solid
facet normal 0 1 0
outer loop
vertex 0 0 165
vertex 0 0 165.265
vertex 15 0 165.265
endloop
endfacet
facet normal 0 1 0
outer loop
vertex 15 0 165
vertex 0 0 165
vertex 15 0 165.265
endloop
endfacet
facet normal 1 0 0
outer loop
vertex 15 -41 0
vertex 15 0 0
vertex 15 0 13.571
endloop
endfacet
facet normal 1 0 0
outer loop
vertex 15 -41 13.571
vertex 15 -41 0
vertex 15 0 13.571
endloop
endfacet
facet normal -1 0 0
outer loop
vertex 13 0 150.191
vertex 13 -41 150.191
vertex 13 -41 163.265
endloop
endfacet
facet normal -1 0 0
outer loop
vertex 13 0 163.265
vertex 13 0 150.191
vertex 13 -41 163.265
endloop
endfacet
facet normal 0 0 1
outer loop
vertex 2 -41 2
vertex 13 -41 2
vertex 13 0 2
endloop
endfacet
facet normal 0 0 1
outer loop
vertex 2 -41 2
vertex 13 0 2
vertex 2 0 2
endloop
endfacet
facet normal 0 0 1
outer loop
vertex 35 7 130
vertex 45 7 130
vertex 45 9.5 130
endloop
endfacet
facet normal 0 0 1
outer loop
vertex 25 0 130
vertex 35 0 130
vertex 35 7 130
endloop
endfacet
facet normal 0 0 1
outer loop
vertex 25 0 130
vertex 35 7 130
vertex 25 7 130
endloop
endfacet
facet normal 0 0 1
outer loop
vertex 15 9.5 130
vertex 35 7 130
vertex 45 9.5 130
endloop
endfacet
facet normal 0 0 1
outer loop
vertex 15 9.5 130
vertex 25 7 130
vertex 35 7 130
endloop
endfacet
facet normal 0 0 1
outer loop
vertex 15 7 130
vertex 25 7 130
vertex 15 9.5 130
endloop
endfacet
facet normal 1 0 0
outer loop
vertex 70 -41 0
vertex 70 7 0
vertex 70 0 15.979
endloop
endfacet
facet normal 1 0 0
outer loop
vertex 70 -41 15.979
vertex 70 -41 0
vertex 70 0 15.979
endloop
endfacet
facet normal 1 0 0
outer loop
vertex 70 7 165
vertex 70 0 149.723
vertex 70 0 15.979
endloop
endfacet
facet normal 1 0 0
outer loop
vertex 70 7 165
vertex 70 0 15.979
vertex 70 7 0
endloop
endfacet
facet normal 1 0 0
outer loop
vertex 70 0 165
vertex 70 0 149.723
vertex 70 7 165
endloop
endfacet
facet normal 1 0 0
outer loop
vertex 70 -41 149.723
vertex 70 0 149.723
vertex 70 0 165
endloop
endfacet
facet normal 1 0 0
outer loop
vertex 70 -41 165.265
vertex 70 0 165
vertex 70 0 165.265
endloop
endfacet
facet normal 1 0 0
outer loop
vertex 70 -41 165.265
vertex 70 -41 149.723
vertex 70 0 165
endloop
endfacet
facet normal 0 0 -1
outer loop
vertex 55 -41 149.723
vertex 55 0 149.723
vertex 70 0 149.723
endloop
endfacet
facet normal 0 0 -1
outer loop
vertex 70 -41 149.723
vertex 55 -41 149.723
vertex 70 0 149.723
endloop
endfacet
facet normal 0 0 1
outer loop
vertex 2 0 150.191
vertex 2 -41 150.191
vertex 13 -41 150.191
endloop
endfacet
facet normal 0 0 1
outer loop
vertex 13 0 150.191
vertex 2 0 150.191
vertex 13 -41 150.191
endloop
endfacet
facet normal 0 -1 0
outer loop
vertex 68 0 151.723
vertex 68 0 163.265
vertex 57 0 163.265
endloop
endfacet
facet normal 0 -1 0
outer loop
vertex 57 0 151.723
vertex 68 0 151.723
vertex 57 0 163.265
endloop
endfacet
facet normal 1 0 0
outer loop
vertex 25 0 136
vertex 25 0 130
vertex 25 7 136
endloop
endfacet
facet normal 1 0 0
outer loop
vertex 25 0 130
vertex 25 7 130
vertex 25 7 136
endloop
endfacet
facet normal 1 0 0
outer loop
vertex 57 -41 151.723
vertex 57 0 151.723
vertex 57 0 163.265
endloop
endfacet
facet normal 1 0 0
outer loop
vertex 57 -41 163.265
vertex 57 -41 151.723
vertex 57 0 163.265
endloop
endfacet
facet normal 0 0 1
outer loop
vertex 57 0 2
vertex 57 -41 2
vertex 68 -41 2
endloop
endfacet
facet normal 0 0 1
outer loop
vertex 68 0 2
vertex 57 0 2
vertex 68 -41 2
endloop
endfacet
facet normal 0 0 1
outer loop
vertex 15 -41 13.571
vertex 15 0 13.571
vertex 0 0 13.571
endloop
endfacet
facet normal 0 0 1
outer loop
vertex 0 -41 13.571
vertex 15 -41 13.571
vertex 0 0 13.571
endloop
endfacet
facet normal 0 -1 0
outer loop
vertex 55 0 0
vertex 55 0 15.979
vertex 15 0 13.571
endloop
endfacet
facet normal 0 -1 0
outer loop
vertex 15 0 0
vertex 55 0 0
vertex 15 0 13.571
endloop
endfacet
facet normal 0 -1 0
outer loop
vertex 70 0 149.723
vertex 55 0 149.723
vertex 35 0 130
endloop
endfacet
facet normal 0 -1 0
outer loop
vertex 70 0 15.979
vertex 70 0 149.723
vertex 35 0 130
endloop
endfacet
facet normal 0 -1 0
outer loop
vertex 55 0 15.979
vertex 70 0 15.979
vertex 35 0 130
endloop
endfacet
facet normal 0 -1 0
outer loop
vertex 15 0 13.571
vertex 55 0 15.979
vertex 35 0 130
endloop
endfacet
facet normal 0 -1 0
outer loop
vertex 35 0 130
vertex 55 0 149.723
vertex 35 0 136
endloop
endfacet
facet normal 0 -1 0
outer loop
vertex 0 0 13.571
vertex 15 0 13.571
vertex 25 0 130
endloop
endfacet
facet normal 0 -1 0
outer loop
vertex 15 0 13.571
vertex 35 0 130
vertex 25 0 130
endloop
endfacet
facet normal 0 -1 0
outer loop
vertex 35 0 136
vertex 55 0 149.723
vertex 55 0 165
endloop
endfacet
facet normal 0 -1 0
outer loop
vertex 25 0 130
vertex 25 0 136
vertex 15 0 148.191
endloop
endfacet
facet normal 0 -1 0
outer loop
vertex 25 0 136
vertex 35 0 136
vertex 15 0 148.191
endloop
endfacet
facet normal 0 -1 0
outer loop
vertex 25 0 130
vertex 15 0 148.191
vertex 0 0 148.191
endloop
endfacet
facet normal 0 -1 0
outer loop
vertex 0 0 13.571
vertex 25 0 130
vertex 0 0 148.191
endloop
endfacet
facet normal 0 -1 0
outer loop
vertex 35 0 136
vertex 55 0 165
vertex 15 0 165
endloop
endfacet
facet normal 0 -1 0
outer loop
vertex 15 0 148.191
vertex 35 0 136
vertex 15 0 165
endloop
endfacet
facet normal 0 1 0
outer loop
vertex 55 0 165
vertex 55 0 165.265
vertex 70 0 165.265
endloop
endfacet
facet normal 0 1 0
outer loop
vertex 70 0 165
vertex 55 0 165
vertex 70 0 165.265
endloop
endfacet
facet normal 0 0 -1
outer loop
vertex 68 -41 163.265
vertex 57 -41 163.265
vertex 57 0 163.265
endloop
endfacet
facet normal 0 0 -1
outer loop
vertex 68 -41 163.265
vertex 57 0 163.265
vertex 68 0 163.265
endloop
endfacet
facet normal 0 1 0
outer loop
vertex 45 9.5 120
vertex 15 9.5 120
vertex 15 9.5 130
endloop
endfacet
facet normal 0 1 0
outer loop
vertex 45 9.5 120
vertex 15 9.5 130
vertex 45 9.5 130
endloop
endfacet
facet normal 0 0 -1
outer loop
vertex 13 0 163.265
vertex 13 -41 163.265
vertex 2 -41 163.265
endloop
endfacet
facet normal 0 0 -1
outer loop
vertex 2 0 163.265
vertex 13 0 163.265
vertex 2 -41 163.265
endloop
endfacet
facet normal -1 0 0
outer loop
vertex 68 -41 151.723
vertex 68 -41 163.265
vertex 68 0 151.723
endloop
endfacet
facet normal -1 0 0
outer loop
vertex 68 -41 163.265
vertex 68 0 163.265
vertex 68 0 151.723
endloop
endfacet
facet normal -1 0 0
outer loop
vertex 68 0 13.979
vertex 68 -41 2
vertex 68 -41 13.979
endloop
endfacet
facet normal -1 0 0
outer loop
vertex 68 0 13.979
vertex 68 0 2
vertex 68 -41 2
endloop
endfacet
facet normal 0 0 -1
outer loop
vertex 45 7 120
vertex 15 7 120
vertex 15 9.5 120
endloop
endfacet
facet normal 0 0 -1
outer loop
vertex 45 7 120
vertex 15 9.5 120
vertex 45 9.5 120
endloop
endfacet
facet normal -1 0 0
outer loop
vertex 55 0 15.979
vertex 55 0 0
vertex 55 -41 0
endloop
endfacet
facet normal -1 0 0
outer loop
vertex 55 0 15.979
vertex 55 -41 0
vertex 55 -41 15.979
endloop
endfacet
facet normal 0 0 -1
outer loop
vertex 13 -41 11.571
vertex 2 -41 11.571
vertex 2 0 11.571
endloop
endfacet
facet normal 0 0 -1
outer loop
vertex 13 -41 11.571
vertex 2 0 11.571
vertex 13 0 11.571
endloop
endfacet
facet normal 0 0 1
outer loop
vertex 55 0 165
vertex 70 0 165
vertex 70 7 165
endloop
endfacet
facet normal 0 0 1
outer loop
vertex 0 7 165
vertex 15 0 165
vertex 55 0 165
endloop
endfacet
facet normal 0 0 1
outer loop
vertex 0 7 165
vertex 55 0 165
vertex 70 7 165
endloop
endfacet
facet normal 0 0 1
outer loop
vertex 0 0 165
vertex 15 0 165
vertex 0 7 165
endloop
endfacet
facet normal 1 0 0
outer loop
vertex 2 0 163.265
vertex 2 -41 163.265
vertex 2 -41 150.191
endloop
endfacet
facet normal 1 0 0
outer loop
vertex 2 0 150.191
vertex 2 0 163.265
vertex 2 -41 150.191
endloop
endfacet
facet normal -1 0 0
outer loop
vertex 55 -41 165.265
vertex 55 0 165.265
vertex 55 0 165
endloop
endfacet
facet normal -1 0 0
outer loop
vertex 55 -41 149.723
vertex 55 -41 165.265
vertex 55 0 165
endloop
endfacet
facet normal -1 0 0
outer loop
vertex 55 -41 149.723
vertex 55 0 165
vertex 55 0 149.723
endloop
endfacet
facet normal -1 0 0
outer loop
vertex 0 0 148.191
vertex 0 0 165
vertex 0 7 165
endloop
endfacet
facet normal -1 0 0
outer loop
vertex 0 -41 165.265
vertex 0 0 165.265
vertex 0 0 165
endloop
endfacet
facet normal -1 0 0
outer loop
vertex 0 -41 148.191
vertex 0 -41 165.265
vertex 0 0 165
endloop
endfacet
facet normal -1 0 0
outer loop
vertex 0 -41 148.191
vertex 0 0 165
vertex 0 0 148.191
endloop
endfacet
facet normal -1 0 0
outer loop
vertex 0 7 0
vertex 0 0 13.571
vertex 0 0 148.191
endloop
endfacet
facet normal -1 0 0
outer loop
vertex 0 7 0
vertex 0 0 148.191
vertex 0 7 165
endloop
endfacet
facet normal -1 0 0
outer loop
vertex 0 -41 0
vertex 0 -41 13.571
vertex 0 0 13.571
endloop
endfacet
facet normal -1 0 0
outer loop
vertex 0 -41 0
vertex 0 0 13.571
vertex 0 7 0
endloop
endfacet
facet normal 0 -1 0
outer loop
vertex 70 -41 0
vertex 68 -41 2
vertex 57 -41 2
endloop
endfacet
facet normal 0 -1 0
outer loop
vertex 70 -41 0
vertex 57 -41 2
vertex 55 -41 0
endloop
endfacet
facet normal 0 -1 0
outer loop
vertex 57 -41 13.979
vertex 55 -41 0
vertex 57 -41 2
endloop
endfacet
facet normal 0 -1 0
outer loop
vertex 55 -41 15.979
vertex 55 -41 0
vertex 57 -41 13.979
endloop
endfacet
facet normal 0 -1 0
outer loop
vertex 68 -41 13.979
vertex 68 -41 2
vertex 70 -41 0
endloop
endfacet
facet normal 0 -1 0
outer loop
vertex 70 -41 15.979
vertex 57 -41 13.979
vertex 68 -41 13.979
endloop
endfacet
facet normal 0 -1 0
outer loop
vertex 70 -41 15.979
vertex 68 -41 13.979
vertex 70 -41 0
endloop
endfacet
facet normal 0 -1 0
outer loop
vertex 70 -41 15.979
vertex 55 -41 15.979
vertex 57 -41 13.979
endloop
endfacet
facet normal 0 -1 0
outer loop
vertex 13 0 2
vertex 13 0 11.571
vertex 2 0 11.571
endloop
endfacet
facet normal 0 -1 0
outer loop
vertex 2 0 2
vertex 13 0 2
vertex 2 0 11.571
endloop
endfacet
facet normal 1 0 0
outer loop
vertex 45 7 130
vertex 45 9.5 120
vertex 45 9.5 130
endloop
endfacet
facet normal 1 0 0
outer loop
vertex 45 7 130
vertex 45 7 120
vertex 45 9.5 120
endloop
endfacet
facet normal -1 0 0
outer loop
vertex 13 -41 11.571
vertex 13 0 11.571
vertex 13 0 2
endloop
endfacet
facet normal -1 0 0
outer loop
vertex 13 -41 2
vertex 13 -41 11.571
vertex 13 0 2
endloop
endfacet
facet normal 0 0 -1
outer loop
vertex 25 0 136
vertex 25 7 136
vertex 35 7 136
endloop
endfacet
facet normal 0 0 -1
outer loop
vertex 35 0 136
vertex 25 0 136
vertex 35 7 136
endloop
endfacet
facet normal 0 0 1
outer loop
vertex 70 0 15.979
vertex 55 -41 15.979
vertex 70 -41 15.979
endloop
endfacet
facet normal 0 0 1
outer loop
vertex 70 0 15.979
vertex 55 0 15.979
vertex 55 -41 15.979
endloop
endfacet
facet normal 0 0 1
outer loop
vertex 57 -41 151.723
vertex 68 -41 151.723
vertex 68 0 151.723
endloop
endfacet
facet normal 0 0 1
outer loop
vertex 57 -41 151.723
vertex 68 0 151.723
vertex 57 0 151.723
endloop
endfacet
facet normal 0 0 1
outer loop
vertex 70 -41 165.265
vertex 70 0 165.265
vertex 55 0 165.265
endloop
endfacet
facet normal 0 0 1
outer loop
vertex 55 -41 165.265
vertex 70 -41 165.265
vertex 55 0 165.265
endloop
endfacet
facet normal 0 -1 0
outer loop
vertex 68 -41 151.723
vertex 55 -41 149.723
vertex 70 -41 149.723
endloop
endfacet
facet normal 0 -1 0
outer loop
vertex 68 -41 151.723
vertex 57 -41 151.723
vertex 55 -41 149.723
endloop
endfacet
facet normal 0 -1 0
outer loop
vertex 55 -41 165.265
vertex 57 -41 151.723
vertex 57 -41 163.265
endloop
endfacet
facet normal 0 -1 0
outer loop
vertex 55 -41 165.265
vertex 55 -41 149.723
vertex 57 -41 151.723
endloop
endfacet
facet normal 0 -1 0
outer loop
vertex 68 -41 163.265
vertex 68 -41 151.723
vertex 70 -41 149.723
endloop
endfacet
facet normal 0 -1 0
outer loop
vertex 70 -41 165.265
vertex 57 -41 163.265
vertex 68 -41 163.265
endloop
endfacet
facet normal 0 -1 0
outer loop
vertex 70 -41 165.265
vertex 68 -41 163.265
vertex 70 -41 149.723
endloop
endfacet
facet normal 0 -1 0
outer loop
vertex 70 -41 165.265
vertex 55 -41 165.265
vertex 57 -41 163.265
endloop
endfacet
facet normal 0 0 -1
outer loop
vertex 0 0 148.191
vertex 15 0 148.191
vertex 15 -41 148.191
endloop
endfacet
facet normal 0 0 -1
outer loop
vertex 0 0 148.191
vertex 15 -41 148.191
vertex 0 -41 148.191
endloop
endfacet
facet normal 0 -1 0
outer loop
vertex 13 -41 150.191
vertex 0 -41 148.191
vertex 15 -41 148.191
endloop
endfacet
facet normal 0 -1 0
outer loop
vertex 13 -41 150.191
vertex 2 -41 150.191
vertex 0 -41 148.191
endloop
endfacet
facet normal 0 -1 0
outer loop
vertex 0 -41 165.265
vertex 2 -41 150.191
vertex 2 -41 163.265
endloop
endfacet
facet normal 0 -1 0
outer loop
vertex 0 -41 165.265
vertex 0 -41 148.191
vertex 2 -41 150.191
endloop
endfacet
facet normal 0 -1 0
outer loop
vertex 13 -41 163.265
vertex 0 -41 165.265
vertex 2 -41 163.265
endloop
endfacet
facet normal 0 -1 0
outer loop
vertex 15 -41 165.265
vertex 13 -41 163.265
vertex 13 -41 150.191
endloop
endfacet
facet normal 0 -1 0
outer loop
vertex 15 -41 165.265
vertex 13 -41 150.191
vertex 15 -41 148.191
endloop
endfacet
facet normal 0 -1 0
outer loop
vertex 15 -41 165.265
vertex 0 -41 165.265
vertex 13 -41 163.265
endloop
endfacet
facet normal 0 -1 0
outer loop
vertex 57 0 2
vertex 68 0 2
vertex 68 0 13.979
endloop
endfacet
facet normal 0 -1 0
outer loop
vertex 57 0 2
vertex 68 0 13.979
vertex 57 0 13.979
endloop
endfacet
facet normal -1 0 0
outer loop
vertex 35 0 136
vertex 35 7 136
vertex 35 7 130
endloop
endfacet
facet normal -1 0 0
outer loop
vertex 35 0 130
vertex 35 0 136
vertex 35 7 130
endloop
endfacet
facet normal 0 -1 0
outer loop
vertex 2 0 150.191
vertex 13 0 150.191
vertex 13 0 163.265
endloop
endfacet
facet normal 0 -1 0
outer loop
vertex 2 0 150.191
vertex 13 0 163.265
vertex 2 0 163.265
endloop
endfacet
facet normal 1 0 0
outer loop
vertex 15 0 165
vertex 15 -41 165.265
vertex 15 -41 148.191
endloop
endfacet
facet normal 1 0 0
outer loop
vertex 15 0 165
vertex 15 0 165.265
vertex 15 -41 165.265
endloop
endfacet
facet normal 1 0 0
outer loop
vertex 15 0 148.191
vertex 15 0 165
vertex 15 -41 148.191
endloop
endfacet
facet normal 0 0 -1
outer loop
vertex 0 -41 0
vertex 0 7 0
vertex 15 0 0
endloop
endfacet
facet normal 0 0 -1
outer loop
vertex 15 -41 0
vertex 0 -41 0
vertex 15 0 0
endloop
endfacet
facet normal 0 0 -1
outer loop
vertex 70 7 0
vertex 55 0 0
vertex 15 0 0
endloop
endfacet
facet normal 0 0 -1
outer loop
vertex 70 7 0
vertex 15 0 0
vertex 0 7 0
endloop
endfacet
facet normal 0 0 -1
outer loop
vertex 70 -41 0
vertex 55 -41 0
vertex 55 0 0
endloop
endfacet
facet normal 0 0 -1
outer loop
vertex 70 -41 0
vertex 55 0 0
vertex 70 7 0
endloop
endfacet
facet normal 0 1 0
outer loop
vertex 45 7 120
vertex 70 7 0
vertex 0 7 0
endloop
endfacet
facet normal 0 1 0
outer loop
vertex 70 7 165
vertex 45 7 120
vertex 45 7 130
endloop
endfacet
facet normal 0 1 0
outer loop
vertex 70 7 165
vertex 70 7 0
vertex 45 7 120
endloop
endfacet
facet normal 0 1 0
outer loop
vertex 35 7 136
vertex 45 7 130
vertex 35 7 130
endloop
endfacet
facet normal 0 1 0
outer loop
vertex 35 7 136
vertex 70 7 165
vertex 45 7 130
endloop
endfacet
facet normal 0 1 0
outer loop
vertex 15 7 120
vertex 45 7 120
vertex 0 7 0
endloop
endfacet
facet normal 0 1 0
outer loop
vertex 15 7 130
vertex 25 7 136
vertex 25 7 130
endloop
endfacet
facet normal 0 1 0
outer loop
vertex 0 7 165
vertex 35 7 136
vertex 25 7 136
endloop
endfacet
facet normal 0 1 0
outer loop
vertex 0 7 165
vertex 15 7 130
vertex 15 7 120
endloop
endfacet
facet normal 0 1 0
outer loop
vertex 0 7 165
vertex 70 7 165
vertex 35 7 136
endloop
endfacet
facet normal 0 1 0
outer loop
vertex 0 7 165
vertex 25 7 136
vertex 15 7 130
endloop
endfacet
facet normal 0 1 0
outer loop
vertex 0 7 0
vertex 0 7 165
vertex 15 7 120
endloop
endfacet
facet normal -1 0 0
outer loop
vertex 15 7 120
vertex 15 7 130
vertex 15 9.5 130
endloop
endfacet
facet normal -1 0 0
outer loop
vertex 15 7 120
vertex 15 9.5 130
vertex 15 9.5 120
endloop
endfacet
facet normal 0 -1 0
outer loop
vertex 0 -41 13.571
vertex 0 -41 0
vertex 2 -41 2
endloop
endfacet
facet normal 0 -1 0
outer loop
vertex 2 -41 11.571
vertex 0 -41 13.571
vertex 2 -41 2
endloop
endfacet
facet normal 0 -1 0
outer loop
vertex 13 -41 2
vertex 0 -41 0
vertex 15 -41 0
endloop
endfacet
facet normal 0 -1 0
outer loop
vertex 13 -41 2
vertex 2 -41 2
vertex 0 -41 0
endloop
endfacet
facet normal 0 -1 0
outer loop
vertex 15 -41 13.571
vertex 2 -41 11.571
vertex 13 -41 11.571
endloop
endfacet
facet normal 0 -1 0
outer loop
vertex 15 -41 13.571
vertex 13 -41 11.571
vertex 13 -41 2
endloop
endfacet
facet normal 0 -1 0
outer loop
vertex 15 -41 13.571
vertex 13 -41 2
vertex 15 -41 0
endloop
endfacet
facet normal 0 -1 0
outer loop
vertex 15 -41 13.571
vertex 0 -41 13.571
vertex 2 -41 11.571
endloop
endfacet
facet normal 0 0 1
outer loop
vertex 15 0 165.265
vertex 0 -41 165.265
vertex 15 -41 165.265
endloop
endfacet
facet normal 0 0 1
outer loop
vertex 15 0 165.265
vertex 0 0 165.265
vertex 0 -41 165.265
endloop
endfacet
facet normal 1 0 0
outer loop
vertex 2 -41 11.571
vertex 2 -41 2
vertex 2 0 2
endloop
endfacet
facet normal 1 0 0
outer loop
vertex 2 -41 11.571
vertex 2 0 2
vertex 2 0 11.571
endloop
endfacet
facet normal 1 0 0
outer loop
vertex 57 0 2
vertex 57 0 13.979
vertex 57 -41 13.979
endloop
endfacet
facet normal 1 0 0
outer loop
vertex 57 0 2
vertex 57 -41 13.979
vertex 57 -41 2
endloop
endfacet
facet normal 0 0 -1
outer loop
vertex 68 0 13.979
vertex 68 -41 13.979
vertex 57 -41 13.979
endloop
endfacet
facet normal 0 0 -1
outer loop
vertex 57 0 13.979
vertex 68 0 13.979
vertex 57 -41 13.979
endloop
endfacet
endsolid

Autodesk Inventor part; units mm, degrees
ref_plane "YZ Plane" through (0, 0, 0) normal (1, 0, 0) x (0, 1, 0)
ref_plane "XZ Plane" through (0, 0, 0) normal (0, 1, 0) x (-1, 0, 0)
ref_plane "XY Plane" through (0, 0, 0) normal (0, 0, 1) x (1, 0, 0)
sketch "Sketch1" plane through (0, 0, 0) normal (0, 1, 0) x (-1, 0, 0)
  line L0 (0, 0) -> (-70, 0)
  line L1 (-70, 0) -> (-70, 165)
  line L2 (-70, 165) -> (0, 165)
  line L3 (0, 165) -> (0, 0)
  dimension "d0" = 70
  dimension "d1" = 165
extrude "Extrusion1" add sketch "Sketch1" along normal blind 7
sketch "Sketch2" plane through (0, 0, 0) normal (0, -1, 0) x (1, 0, 0)
  line L0 (70, 165) -> (70, 0) projected
  line L1 (70, 0) -> (55, 0)
  line L2 (55, 0) -> (55, 15.9792)
  line L3 (55, 15.9792) -> (70, 15.9792)
  line L4 (70, 15.9792) -> (70, 0)
  line L5 (70, 0) -> (0, 0) projected
  line L6 (0, 0) -> (15, 0)
  line L7 (15, 0) -> (15, 13.5714)
  line L8 (15, 13.5714) -> (0, 13.5714)
  line L9 (0, 13.5714) -> (0, 0)
  line L10 (70, 165.2646) -> (55, 165.2646)
  line L11 (55, 165.2646) -> (55, 149.7232)
  line L12 (55, 149.7232) -> (70, 149.7232)
  line L13 (70, 149.7232) -> (70, 165.2646)
  line L14 (0, 165.2646) -> (15, 165.2646)
  line L15 (15, 165.2646) -> (15, 148.1909)
  line L16 (15, 148.1909) -> (0, 148.1909)
  line L17 (0, 148.1909) -> (0, 165.2646)
  line L18 (68, 151.7232) -> (57, 151.7232)
  line L19 (57, 151.7232) -> (57, 163.2646)
  line L20 (57, 163.2646) -> (68, 163.2646)
  line L21 (68, 163.2646) -> (68, 151.7232)
  line L22 (2, 150.1909) -> (13, 150.1909)
  line L23 (13, 150.1909) -> (13, 163.2646)
  line L24 (13, 163.2646) -> (2, 163.2646)
  line L25 (2, 163.2646) -> (2, 150.1909)
  line L26 (2, 11.5714) -> (13, 11.5714)
  line L27 (13, 11.5714) -> (13, 2)
  line L28 (13, 2) -> (2, 2)
  line L29 (2, 2) -> (2, 11.5714)
  line L30 (68, 13.9792) -> (57, 13.9792)
  line L31 (57, 13.9792) -> (57, 2)
  line L32 (57, 2) -> (68, 2)
  line L33 (68, 2) -> (68, 13.9792)
  dimension "d4" = 15
  dimension "d5" = 15
  dimension "d6" = 15
  dimension "d7" = 15
  dimension "d8" = 2
  dimension "d9" = 2
  dimension "d10" = 2
  dimension "d11" = 2
extrude "Extrusion2" add sketch "Sketch2" along normal blind 41
sketch "Sketch8" plane through (0, 7, 0) normal (0, 1, 0) x (1, 0, 0)
  line L0 (0, 0) -> (0, -165) projected
  line L1 (0, -165) -> (0, -130)
  line L2 (35, -130) -> (25, -130)
  line L3 (25, -130) -> (25, -136)
  line L4 (25, -136) -> (35, -136)
  line L5 (35, -136) -> (35, -130)
  line L6 (15, -130) -> (15, -120)
  line L7 (15, -120) -> (45, -120)
  line L8 (45, -120) -> (45, -130)
  line L9 (45, -130) -> (15, -130)
  line L10 (15, -130) -> (15, -120)
  dimension "d45" = 35
  dimension "d47" = 10
  dimension "d53" = 30
extrude "Extrusion8" add sketch "Sketch8" along normal blind 2.5 contours L2 L9 L6 L7 L8
extrude "Extrusion9" cut sketch "Sketch8" against normal blind 7 contours L5 L4 L3 L2
properties part number "piano laterale"
